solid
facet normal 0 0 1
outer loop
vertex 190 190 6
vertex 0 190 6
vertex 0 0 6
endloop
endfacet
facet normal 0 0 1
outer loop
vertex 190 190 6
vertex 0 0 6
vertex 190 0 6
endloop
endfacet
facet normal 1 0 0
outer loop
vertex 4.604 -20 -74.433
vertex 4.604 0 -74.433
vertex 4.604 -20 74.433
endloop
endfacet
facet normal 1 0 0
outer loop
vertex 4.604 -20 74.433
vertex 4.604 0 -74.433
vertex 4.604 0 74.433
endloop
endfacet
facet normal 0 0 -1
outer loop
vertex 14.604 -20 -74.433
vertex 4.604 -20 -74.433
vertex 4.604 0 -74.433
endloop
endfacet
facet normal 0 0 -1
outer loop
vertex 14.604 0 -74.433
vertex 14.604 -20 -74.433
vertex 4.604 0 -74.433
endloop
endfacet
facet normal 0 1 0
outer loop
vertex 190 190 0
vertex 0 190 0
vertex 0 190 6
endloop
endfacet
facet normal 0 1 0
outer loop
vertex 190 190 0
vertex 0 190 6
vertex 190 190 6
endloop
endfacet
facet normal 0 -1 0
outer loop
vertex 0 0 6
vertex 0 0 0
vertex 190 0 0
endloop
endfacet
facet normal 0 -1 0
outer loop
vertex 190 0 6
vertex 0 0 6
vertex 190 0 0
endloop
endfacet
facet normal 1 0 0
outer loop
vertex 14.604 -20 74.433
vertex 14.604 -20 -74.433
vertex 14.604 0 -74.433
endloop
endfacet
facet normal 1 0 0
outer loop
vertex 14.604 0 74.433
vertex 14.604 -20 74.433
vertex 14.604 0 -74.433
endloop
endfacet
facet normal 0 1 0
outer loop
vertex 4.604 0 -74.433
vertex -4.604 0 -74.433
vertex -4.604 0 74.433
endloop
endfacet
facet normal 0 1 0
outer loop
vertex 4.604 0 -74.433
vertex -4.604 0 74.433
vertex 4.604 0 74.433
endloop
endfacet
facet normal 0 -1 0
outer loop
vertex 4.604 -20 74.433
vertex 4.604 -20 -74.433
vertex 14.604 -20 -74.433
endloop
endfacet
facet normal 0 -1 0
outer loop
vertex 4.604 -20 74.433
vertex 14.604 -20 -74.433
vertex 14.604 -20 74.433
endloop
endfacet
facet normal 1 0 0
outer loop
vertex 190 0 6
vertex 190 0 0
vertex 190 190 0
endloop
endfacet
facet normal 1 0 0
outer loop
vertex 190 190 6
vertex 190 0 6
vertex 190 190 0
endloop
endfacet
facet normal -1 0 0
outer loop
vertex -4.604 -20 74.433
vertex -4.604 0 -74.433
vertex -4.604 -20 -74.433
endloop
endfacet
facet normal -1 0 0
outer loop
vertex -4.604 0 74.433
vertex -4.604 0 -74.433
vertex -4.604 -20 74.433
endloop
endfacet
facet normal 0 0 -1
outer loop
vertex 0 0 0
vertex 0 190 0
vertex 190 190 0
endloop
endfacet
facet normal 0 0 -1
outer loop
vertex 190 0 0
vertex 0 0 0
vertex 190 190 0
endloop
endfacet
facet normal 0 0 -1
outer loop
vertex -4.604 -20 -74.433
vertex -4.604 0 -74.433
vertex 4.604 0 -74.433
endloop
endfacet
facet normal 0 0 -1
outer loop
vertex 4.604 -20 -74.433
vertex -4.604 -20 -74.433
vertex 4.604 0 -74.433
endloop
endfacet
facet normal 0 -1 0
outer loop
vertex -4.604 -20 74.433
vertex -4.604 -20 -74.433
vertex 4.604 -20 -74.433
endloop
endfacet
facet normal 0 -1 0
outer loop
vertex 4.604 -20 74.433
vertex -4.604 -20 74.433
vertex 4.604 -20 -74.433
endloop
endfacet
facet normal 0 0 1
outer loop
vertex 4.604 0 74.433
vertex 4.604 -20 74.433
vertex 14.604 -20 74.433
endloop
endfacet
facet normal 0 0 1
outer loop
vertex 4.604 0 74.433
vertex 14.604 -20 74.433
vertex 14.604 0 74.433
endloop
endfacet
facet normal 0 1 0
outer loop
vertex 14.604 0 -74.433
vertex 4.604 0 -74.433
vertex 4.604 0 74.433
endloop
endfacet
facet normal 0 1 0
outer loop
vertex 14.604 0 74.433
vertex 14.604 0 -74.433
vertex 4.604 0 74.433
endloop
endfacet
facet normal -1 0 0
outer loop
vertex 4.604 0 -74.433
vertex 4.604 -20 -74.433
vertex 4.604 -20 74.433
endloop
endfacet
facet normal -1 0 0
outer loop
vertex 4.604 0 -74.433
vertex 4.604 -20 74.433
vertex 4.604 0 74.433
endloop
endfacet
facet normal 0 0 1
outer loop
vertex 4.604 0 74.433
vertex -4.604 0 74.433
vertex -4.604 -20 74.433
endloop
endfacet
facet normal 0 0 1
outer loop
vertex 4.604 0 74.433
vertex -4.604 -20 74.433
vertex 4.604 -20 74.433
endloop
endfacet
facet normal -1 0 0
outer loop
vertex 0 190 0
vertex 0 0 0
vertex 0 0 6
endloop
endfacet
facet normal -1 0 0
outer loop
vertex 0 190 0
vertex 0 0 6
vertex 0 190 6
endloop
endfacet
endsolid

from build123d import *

# Parameters (mm, degrees)
F0_W      = 190
F0_H      = 190
F1_DEPTH  = 6
F2_W      = 9.207172
F2_H      = 148.86655
F3_DEPTH  = 20
F3_FACE_W = 20
F3_FACE_H = 148.86655
F4_DEPTH  = 10


with BuildPart() as f1:
    # F0 (on Top) → F1 (new body)
    with BuildSketch(Plane.XY):
        with Locations((95, 95)):
            Rectangle(F0_W, F0_H)
    extrude(amount=F1_DEPTH)


with BuildPart() as f3:
    # F2 (on Front) → F3 (new body)
    with BuildSketch(Plane.XZ):
        Rectangle(F2_W, F2_H)
    extrude(amount=F3_DEPTH)


with BuildPart() as f4:
    # F3_face (on face) → F4 (new body)
    with BuildSketch(Plane(origin=(4.603586, -10, 0), x_dir=(0, 1, 0), z_dir=(1, 0, 0))):
        Rectangle(F3_FACE_W, F3_FACE_H)
    extrude(amount=F4_DEPTH)


solid = Compound([f1.part, f3.part, f4.part])
